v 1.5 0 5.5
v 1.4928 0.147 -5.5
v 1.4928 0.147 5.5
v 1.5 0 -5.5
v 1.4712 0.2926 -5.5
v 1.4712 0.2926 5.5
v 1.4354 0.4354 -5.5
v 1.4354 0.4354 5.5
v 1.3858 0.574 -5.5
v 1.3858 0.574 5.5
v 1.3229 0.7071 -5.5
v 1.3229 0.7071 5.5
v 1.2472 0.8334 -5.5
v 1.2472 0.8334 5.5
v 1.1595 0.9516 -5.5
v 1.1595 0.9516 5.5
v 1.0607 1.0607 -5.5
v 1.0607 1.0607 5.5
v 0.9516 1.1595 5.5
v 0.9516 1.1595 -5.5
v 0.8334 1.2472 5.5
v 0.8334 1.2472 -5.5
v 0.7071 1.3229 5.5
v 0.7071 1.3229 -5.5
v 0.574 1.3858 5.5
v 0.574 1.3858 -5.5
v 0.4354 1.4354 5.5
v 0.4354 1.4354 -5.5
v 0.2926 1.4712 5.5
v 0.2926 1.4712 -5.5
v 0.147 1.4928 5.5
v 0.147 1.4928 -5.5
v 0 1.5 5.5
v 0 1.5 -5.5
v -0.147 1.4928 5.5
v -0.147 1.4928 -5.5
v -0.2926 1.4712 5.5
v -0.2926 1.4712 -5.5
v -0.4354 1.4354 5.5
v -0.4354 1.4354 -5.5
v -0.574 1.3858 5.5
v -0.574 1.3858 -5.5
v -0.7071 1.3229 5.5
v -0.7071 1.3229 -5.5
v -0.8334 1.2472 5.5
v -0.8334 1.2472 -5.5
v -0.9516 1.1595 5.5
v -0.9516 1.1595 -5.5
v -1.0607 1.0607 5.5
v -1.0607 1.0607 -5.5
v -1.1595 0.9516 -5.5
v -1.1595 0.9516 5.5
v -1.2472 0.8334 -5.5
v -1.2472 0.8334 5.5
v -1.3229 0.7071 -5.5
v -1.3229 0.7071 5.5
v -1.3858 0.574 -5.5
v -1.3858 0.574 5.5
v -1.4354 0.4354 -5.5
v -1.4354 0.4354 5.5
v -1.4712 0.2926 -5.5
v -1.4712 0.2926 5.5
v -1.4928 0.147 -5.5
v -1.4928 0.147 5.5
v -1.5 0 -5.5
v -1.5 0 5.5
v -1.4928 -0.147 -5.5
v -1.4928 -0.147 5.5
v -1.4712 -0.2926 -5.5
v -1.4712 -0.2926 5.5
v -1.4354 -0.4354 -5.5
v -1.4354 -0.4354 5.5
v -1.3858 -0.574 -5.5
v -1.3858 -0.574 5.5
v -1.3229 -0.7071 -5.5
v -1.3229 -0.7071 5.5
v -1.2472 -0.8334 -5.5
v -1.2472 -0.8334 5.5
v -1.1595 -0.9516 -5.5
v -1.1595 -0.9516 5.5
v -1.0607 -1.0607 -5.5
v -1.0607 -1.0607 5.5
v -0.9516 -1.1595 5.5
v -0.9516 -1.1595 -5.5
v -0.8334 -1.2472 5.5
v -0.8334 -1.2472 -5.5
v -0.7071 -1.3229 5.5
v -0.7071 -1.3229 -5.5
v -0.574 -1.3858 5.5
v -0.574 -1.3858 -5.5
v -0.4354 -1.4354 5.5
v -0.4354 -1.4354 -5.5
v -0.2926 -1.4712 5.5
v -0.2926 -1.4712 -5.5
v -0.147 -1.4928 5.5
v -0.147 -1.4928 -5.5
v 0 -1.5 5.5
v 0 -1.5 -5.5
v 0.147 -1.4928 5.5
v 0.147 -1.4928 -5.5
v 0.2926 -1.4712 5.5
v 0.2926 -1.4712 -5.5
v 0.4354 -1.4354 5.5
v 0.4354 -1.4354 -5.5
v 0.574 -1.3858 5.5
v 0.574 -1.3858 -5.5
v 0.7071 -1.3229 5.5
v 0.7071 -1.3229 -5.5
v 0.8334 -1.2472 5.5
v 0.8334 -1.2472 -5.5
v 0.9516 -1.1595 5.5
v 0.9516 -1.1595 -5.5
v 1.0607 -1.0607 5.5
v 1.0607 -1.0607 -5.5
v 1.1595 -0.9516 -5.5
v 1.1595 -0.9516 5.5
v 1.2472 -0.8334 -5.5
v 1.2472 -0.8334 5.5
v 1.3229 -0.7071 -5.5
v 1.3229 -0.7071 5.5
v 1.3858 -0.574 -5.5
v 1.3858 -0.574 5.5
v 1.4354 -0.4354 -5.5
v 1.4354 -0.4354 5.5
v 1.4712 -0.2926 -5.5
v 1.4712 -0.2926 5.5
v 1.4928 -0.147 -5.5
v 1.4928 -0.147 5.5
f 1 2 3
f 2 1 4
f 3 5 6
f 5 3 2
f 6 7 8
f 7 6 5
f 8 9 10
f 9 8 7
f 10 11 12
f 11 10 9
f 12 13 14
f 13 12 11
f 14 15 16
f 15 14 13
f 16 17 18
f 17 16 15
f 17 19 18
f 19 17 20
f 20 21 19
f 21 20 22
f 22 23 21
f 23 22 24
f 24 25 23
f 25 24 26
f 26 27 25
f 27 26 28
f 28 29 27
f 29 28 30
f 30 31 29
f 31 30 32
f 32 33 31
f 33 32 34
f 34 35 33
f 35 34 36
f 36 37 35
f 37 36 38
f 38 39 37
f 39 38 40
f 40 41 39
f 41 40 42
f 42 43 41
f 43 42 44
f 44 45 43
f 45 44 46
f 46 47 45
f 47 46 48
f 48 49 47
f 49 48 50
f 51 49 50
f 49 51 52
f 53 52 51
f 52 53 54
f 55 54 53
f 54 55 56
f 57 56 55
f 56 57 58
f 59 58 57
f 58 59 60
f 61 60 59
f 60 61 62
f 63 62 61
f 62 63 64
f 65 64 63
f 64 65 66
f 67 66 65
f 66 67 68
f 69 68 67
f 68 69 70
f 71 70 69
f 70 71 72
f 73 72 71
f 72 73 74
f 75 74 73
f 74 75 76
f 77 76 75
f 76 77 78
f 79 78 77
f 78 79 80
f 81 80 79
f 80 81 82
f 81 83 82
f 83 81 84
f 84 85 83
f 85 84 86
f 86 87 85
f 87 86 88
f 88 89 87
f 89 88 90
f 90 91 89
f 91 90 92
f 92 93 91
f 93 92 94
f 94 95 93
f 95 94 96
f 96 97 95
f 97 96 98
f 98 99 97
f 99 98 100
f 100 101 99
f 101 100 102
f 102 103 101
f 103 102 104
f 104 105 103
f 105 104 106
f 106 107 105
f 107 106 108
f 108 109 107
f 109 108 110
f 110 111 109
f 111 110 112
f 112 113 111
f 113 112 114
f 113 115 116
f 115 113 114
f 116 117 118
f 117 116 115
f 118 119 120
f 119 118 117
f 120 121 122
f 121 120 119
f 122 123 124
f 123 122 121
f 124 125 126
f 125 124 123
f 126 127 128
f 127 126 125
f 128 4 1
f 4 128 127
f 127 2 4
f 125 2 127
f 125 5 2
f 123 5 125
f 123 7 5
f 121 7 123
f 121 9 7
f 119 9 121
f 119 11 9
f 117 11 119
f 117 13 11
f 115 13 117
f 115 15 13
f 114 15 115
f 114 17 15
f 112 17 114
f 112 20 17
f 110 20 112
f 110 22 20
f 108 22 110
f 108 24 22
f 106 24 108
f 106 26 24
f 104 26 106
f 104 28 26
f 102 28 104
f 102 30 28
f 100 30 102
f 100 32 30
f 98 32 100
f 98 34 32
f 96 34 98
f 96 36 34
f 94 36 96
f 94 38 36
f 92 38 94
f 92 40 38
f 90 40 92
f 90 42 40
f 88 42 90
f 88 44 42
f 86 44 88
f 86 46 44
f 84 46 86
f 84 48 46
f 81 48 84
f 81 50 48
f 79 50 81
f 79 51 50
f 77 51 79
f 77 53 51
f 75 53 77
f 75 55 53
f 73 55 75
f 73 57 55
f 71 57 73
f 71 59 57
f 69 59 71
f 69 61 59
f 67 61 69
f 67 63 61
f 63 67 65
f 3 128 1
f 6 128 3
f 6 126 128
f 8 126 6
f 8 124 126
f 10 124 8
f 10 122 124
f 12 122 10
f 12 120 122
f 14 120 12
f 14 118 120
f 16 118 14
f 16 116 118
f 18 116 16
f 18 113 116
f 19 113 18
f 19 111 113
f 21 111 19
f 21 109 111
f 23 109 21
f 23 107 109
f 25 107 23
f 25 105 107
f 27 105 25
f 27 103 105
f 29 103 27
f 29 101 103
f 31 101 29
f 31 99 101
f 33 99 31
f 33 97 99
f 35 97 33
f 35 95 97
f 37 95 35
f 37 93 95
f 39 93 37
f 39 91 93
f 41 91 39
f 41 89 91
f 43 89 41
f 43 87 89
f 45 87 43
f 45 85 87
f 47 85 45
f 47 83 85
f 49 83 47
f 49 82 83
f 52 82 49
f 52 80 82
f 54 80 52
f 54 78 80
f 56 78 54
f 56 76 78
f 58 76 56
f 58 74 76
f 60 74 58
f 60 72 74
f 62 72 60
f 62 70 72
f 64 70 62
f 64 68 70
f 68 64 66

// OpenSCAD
// Part A8: simple rivet pin.
// SPDX-License-Identifier: MIT

module part_a8(pin_d = 3.0, pin_h = 11.0) {
    cylinder(d = pin_d, h = pin_h, center = true, $fn = 64);
}


// ---- "main guard" ----
// Default to previewing when opened directly:
if (is_undef(__LIB_MODE__)) {
    part_a8();
}
